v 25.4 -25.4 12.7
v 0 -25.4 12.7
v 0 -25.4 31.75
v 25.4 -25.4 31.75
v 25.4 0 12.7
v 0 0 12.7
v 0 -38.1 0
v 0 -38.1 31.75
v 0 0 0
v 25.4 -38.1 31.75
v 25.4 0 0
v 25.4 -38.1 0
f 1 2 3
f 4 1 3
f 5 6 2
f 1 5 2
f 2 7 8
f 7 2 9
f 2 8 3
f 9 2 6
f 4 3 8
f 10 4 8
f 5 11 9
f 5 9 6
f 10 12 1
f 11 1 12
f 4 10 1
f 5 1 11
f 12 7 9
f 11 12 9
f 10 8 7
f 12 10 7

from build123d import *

# Parameters (mm, degrees)
F1_DEPTH = 25.4
F2_DEPTH = 25.4


with BuildPart() as f1:
    # F0 (on Right) → F1 (new body)
    with BuildSketch(Plane.YZ):
        Polygon((-38.1, 0), (0, 0), (0, 12.7), (-25.4, 12.7), (-25.4, 31.75), (-38.1, 31.75), align=None)
    extrude(amount=F1_DEPTH)

    # F0 (on Right) → F2 (join)
    with BuildSketch(Plane.YZ):
        Polygon((-38.1, 0), (0, 0), (0, 12.7), (-25.4, 12.7), (-25.4, 31.75), (-38.1, 31.75), align=None)
    extrude(amount=F2_DEPTH)


solid = f1.part
